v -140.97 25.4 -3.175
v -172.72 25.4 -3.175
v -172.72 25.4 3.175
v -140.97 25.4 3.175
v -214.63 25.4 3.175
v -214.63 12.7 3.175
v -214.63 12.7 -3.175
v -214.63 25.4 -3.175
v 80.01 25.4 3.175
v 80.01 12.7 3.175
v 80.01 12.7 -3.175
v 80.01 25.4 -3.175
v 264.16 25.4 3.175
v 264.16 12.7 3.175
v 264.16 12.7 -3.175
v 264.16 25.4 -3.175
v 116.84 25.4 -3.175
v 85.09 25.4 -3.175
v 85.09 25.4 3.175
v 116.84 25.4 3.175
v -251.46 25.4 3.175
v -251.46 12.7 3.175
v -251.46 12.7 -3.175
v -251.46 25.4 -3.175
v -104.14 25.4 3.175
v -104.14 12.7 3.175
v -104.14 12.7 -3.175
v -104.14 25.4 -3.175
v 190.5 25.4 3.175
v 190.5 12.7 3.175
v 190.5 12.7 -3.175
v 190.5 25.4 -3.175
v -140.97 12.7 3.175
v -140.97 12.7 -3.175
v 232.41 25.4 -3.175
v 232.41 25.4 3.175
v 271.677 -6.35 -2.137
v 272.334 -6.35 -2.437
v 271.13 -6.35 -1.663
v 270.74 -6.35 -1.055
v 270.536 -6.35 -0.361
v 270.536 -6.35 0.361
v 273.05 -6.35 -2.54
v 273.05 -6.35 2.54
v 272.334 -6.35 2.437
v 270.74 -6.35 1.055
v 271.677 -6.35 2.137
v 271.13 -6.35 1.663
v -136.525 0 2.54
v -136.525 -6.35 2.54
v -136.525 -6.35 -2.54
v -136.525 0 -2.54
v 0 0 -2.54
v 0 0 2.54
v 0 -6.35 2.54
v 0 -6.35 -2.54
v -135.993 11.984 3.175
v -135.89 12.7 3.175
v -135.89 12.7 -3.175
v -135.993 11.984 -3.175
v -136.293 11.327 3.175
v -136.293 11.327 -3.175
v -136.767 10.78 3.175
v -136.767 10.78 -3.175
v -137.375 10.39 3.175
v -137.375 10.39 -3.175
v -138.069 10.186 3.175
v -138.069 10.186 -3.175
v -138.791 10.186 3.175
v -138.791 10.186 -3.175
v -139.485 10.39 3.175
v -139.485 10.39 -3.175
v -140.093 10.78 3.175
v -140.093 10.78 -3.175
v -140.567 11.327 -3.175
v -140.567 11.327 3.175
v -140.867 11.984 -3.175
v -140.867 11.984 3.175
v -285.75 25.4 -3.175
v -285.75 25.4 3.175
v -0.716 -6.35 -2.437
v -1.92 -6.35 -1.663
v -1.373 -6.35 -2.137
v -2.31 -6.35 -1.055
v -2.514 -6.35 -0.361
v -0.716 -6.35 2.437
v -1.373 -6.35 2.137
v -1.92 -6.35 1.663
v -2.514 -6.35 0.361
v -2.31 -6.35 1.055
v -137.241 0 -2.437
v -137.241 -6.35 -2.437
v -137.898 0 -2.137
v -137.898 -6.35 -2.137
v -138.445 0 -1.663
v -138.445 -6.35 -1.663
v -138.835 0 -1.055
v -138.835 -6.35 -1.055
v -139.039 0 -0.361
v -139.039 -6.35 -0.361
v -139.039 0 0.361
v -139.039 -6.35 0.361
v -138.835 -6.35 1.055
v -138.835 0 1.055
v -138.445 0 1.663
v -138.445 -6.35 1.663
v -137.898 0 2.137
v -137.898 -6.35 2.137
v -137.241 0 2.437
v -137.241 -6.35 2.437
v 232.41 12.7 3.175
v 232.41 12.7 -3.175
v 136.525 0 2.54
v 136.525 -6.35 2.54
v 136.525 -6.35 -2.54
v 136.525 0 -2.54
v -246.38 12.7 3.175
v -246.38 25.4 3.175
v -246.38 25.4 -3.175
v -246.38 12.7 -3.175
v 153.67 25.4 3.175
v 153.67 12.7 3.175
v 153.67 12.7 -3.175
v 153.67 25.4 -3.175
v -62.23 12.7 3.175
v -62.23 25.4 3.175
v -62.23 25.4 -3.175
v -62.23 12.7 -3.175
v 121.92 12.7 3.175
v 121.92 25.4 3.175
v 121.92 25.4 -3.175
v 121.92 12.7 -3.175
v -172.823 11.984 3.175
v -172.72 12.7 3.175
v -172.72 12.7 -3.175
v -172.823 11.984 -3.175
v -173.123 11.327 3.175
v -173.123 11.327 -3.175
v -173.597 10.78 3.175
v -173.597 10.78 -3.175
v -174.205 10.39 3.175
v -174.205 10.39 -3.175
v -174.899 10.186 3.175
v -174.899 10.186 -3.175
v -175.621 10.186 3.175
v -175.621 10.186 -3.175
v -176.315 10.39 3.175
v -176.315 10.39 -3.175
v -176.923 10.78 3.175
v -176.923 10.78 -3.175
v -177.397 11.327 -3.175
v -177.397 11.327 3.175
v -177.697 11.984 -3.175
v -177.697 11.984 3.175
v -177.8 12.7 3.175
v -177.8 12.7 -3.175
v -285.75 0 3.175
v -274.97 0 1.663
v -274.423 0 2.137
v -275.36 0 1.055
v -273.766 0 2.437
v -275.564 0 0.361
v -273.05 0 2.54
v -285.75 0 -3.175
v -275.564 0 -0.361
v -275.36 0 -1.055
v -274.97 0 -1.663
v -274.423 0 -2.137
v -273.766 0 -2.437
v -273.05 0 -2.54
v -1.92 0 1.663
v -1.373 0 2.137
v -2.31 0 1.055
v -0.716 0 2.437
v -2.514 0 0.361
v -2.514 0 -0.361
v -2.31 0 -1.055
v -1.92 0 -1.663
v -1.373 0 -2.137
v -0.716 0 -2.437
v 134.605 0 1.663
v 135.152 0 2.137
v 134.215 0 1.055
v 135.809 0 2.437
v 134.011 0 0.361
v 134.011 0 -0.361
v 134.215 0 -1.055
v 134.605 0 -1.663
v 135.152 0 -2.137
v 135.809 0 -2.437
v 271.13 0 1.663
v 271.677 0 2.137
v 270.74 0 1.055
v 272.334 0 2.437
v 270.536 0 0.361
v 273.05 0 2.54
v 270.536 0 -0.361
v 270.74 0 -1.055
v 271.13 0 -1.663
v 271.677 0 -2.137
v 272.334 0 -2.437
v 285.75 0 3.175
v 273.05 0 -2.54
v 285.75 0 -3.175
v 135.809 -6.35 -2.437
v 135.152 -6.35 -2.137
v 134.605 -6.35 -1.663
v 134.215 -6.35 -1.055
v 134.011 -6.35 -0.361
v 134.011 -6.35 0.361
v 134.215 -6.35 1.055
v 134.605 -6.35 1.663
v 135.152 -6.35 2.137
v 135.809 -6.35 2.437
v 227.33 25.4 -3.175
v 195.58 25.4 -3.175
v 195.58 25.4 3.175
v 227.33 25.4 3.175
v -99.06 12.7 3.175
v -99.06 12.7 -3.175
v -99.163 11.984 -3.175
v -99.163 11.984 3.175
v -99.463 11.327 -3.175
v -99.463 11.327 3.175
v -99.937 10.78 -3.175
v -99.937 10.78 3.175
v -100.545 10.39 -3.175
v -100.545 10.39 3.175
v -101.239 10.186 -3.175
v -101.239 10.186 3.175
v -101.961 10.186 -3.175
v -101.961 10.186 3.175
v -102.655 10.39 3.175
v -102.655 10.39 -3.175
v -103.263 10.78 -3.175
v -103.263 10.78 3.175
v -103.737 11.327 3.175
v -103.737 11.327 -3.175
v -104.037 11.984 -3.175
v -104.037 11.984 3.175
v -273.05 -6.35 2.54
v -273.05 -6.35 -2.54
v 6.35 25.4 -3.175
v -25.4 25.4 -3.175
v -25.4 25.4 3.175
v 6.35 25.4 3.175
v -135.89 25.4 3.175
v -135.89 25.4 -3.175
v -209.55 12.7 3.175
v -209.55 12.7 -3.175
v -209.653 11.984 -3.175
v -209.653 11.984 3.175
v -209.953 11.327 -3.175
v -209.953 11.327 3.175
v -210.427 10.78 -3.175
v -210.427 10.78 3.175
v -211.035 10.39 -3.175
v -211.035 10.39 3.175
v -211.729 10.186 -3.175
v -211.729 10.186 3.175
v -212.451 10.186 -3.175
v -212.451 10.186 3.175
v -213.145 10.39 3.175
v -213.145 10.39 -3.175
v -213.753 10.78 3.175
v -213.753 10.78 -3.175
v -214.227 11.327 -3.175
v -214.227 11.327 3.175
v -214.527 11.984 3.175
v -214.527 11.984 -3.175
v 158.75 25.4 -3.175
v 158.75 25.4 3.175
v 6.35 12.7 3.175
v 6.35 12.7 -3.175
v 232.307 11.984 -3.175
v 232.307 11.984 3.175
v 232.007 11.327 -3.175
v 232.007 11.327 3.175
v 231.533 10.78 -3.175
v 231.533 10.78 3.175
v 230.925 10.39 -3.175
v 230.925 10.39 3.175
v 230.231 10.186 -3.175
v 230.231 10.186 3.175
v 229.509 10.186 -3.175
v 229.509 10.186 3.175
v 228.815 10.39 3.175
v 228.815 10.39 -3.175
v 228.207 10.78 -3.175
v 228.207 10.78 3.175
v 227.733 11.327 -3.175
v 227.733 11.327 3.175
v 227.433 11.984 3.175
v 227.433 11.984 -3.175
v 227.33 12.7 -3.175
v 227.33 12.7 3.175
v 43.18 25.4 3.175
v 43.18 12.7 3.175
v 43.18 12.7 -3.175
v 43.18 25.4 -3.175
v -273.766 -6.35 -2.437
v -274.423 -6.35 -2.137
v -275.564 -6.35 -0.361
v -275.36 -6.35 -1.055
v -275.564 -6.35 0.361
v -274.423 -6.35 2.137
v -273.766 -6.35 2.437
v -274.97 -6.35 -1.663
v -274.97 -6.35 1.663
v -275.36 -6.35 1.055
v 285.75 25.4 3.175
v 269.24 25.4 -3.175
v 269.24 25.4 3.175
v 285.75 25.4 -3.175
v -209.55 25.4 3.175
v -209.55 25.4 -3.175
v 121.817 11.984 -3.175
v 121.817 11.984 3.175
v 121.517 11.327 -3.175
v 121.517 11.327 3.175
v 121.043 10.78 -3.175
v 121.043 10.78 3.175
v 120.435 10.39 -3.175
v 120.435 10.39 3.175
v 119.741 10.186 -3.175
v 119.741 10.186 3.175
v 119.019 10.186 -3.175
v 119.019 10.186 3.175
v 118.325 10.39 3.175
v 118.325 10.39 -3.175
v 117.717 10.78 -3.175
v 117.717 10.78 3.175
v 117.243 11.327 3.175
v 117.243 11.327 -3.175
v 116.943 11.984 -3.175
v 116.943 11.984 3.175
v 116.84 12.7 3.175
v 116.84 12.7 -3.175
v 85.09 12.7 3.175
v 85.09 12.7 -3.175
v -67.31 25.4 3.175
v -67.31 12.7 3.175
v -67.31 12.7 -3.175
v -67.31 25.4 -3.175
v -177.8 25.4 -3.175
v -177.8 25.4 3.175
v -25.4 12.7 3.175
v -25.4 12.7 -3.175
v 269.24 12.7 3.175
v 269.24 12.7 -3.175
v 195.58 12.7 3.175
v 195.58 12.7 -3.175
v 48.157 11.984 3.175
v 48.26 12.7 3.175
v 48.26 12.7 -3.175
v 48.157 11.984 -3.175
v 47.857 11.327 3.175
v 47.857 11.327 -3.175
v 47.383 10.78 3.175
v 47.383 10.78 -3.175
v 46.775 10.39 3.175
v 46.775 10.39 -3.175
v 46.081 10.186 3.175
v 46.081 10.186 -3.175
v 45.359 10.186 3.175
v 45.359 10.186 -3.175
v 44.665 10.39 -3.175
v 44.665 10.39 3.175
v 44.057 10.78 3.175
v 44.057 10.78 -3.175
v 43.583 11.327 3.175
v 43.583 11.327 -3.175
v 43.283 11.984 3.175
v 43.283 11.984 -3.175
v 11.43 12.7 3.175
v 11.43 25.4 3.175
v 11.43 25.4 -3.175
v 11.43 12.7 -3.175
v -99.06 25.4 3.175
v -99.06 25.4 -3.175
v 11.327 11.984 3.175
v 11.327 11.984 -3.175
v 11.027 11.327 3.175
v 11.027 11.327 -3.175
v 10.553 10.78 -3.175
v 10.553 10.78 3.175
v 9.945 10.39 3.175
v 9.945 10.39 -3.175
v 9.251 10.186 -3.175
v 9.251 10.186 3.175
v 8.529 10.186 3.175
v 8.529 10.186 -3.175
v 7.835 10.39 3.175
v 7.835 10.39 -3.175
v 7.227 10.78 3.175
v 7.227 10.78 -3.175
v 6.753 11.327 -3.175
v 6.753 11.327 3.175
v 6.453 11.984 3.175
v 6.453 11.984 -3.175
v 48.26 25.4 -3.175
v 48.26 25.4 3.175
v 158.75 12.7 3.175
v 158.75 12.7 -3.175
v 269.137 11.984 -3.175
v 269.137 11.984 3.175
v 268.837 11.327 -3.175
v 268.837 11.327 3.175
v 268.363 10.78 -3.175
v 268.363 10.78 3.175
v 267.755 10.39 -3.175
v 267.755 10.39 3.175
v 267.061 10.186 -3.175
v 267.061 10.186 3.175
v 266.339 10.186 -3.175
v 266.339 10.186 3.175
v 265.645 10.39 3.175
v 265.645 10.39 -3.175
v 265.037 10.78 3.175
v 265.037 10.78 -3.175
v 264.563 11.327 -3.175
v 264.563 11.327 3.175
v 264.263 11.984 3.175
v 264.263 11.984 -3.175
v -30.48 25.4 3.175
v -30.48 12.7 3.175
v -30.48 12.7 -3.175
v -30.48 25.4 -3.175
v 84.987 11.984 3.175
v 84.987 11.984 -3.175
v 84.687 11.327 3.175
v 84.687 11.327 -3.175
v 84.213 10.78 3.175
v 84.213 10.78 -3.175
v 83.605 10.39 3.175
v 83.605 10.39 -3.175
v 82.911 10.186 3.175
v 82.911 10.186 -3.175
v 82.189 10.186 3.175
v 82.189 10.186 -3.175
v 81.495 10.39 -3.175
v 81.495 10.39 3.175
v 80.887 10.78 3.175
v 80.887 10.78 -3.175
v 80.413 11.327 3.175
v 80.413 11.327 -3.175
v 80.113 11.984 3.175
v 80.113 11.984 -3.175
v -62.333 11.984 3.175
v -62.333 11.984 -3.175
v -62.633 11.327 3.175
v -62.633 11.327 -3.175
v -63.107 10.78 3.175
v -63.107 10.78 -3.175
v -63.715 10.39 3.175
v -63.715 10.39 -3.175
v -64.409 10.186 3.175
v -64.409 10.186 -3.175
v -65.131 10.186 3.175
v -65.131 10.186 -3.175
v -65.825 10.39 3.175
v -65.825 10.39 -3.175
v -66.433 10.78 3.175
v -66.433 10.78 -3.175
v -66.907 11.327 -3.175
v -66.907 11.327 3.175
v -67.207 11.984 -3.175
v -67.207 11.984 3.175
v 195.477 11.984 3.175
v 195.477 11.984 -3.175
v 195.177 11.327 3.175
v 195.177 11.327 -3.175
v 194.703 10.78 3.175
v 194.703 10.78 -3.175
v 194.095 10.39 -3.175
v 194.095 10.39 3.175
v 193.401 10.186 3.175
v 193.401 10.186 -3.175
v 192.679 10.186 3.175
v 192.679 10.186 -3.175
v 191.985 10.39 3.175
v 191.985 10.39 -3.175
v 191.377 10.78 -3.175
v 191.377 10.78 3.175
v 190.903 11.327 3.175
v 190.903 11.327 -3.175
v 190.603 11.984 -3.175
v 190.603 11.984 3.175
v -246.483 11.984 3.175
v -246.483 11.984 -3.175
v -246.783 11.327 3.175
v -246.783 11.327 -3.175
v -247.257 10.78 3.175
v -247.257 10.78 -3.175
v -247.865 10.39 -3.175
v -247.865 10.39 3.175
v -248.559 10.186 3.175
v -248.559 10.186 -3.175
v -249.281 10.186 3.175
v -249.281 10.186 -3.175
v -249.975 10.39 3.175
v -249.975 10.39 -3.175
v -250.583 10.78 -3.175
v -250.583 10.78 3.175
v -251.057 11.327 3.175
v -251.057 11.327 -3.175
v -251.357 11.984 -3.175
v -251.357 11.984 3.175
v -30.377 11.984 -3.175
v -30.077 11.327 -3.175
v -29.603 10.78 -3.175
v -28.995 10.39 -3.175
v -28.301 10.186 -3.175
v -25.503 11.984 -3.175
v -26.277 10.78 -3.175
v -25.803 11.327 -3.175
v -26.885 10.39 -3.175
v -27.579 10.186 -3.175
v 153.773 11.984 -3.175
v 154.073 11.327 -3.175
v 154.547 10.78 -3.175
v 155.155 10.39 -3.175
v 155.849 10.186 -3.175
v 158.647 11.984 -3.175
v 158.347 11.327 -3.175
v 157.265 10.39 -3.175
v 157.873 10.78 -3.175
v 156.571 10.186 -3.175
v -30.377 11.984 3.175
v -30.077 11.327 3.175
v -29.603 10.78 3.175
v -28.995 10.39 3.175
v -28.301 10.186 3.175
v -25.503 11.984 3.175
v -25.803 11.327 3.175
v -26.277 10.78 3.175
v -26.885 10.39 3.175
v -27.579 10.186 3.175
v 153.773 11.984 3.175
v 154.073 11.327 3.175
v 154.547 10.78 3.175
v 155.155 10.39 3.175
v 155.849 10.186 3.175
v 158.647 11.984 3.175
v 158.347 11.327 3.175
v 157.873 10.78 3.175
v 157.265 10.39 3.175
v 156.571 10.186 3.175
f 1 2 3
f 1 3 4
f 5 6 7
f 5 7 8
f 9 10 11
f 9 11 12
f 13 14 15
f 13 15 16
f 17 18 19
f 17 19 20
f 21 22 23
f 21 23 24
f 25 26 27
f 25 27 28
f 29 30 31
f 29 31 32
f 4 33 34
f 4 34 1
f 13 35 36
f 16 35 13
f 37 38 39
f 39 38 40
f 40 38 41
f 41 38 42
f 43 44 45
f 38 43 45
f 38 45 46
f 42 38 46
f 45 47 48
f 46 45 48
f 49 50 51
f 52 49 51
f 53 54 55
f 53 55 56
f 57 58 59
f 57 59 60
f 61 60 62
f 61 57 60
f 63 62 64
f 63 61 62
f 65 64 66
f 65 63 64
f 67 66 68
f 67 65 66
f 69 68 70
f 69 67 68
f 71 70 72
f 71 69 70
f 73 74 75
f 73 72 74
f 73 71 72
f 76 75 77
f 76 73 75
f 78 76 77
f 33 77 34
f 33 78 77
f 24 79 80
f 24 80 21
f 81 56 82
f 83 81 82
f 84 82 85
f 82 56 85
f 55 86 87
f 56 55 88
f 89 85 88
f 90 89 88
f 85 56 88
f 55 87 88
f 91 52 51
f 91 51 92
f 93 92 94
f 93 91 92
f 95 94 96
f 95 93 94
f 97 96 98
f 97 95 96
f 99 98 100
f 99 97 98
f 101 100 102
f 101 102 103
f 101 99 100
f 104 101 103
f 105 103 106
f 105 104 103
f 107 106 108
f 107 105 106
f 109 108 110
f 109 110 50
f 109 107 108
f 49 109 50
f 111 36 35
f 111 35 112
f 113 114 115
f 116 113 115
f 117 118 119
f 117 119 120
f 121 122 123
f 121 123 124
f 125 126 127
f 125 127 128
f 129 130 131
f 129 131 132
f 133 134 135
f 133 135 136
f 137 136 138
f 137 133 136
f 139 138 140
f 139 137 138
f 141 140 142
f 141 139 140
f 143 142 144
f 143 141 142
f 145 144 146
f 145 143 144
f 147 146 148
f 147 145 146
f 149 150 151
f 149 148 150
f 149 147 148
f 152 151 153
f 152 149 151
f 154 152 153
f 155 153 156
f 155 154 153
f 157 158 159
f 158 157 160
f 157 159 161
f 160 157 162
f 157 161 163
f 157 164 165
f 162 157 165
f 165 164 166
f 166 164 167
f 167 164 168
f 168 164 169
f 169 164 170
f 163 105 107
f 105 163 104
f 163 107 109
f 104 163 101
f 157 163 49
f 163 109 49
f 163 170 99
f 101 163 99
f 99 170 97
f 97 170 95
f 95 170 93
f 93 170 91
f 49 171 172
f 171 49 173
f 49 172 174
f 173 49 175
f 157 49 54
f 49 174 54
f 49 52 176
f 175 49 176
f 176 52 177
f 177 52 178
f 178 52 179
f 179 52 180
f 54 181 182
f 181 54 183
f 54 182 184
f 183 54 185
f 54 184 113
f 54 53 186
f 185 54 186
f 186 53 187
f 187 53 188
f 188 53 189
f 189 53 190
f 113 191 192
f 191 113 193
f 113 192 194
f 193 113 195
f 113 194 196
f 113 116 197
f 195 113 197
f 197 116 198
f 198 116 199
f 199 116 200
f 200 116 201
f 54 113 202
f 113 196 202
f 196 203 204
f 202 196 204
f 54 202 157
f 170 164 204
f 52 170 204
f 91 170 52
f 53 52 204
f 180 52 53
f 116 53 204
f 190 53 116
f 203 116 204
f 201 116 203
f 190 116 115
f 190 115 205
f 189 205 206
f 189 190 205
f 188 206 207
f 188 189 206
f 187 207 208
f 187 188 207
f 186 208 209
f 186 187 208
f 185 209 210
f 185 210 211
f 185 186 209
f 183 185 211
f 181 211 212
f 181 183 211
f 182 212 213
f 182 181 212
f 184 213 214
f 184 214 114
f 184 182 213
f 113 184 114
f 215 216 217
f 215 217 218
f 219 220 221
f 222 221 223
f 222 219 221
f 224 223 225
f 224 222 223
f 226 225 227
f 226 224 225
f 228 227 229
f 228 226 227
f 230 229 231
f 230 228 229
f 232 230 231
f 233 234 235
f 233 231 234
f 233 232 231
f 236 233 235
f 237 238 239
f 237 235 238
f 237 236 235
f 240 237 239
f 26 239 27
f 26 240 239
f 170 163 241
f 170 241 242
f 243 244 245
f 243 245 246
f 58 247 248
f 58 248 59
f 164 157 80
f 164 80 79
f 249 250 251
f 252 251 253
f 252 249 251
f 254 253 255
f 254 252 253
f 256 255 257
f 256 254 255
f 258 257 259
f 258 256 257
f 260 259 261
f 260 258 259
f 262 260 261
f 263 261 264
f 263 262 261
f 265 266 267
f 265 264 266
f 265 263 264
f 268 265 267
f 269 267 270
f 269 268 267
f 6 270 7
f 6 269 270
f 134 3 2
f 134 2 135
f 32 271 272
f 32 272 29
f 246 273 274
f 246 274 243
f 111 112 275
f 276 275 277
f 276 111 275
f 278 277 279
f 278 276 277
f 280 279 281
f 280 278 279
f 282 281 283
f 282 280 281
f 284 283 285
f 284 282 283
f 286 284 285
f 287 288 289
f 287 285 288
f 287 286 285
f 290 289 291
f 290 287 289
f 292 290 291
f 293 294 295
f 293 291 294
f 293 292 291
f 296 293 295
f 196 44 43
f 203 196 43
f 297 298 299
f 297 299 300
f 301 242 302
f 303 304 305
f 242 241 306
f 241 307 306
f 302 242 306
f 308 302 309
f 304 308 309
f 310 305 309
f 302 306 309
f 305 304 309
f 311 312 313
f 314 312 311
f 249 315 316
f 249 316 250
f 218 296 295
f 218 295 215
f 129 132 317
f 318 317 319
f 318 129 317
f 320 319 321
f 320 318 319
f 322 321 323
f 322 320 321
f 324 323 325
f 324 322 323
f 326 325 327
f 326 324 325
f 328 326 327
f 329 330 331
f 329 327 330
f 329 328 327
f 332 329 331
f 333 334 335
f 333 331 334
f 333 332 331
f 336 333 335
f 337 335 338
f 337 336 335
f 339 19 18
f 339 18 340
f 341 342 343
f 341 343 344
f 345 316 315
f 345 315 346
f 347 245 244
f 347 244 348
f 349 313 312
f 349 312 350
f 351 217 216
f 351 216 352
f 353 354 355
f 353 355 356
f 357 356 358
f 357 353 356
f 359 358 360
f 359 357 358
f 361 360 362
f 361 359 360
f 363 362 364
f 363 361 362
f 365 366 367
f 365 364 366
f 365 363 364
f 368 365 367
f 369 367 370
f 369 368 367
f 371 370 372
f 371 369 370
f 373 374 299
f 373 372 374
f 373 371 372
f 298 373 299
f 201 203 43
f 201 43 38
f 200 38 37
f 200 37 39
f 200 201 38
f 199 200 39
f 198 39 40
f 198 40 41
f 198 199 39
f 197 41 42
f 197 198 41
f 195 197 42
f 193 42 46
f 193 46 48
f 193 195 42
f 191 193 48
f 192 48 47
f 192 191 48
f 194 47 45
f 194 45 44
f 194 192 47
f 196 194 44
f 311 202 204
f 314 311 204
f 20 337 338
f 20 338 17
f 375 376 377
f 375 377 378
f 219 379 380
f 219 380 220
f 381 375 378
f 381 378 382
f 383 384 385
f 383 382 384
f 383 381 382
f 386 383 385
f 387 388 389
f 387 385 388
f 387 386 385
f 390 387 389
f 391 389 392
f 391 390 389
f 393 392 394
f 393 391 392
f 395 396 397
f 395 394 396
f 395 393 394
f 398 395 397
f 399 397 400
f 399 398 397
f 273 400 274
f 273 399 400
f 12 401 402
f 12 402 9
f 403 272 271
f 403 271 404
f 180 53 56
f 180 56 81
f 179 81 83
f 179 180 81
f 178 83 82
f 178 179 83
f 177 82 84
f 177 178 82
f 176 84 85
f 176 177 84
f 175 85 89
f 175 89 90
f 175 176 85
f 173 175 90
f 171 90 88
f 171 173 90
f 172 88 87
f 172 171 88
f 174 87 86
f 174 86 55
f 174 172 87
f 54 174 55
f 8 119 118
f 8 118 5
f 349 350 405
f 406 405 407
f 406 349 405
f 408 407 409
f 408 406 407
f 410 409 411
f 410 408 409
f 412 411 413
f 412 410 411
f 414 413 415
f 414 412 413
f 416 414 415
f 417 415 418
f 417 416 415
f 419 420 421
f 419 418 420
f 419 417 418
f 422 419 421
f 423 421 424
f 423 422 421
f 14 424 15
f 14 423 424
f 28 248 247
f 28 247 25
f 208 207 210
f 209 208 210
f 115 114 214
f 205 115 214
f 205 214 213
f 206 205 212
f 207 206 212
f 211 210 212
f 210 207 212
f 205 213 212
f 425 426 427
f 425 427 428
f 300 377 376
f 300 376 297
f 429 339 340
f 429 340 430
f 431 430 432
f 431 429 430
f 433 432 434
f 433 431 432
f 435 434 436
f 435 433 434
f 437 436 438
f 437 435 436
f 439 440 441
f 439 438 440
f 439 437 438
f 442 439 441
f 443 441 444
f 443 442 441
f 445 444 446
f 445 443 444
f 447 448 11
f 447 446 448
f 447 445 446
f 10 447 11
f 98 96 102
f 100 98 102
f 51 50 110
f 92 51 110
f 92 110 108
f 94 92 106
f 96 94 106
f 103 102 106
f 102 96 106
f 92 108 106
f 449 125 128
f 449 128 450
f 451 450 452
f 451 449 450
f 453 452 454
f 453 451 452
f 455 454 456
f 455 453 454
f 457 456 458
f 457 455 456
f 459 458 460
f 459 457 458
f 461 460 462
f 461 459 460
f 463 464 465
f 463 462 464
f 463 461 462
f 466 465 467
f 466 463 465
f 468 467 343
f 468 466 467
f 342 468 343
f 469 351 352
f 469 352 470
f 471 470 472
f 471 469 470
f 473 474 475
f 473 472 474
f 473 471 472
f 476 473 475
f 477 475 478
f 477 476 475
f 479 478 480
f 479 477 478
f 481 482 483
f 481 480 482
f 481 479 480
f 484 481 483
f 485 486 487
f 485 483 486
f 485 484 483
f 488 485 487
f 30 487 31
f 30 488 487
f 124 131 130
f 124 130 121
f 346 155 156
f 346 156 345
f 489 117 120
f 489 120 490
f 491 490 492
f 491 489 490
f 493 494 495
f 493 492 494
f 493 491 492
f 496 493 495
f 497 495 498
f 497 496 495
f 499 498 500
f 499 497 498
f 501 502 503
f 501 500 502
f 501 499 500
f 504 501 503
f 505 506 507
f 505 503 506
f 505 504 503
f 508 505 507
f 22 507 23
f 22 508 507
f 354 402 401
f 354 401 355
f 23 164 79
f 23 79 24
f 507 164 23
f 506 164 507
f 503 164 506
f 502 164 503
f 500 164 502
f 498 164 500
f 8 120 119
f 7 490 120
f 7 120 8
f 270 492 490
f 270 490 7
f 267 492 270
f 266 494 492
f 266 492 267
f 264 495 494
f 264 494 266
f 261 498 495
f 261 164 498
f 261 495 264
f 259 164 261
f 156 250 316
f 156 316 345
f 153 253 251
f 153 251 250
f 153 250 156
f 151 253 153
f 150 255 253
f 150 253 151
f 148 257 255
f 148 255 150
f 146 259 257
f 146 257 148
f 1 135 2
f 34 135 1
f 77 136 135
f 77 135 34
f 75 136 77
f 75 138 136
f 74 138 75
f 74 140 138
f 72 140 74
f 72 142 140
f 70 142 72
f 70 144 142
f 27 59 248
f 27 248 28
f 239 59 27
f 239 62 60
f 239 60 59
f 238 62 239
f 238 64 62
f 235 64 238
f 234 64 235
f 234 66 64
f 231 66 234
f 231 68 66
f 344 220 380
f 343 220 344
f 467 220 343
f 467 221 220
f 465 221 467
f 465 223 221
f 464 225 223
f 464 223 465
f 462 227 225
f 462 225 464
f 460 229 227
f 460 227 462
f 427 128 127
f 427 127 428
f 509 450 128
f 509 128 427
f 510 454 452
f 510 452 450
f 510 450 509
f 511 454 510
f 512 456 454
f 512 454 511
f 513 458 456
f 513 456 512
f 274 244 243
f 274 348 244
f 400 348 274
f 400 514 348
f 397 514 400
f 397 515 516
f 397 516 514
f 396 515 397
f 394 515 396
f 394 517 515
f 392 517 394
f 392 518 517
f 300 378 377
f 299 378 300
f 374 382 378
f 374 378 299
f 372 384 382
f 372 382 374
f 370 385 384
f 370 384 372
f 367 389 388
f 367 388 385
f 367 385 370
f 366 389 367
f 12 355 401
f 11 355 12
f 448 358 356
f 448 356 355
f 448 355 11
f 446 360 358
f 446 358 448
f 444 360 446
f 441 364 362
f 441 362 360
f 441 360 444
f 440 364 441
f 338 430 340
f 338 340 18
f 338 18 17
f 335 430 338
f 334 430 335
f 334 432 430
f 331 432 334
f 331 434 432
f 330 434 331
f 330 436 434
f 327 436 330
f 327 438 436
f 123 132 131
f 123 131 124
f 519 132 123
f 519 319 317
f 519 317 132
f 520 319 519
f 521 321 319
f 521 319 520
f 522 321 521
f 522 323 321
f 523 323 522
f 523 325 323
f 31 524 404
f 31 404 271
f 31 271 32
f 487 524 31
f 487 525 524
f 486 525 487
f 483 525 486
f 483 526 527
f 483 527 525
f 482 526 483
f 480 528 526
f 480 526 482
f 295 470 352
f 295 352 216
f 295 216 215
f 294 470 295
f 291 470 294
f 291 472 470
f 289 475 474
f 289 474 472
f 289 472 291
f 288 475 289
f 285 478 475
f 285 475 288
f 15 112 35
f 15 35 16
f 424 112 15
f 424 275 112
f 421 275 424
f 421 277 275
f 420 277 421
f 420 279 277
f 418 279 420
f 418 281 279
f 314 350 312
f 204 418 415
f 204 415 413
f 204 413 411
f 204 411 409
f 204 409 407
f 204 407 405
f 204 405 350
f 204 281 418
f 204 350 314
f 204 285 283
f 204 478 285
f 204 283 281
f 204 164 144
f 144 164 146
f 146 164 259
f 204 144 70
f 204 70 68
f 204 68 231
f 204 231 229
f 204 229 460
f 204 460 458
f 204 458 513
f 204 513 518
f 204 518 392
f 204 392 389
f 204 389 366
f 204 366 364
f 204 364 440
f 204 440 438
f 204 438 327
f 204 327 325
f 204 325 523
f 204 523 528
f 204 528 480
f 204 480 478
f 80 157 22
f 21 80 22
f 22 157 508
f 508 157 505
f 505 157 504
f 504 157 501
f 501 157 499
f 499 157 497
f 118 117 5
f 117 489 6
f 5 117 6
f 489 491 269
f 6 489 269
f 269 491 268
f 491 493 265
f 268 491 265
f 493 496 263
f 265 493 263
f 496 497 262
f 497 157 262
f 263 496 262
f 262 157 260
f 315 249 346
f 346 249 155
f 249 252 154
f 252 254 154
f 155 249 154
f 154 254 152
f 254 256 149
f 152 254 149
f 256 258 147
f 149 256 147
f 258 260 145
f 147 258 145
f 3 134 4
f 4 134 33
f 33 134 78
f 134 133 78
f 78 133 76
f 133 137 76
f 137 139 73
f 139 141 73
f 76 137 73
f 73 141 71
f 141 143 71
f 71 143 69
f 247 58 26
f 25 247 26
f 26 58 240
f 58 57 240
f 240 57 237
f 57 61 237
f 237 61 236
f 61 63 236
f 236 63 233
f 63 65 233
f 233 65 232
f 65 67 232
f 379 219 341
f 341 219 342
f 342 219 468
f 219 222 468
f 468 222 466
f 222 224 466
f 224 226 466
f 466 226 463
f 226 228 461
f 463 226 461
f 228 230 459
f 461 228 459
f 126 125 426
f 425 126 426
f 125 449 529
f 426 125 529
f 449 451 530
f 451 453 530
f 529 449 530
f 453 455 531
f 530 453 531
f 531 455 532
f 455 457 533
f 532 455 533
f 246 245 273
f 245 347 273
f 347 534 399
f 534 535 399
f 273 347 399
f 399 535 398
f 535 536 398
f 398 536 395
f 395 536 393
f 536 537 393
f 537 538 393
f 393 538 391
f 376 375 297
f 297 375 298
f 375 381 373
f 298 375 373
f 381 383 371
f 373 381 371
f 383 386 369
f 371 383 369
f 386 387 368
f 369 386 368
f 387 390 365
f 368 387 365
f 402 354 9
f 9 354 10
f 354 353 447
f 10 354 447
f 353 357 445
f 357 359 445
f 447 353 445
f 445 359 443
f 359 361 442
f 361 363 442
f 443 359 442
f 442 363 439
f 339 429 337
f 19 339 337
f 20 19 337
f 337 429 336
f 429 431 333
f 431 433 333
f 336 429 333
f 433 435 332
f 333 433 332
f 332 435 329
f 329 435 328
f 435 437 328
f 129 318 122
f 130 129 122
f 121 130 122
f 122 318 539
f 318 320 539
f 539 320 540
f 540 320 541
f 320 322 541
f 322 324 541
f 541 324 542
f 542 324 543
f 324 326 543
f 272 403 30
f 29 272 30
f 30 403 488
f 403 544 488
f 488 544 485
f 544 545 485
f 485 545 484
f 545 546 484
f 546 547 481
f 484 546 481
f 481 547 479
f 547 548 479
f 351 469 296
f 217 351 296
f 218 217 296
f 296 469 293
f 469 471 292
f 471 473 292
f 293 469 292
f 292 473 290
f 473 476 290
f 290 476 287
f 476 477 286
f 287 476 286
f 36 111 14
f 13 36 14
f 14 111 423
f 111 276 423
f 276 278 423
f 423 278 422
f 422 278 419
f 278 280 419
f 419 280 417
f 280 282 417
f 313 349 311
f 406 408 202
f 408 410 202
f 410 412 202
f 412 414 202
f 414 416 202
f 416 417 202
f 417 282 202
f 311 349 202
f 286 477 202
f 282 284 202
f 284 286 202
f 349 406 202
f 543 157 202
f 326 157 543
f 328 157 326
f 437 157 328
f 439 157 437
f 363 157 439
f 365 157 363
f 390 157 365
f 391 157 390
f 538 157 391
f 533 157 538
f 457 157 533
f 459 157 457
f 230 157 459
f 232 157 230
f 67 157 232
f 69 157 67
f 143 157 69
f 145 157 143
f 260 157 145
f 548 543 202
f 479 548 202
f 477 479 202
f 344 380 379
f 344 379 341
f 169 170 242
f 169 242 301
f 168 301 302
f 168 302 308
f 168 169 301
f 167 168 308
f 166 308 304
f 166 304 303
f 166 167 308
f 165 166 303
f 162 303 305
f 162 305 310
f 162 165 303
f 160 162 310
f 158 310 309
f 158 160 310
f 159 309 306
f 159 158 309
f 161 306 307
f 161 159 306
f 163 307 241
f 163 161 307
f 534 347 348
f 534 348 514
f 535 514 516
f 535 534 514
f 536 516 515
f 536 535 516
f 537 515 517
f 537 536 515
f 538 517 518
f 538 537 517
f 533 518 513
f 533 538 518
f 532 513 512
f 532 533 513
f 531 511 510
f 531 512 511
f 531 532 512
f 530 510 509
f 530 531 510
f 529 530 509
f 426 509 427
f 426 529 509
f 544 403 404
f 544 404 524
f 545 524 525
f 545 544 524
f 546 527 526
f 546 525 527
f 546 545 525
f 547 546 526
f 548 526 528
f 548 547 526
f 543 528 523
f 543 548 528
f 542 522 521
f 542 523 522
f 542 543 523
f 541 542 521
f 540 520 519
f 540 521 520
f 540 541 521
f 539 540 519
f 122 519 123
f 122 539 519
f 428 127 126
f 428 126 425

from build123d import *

# Parameters (mm, degrees)
SKETCH1_W           = 571.5
SKETCH1_H           = 6.35
BOSS_EXTRUDE1_DEPTH = 25.4
BOSS_EXTRUDE2_DEPTH = 6.35
CUT_EXTRUDE1_DEPTH  = 287.946937603


with BuildPart() as part:
    # Sketch1 → Boss-Extrude1 (new body)
    with BuildSketch(Plane(origin=(0, 0, 0), x_dir=(1, 0, 0), z_dir=(0, 1, 0))):
        Rectangle(SKETCH1_W, SKETCH1_H)
    extrude(amount=BOSS_EXTRUDE1_DEPTH)

    # Sketch2 → Boss-Extrude2 (add)
    with BuildSketch(Plane.XZ):
        with BuildLine():
            Line((-273.05, 2.54), (-273.05, -2.54))
            ThreePointArc((-273.05, -2.54), (-275.59, 0), (-273.05, 2.54))
        make_face()
        with BuildLine():
            Line((-136.525, 2.54), (-136.525, -2.54))
            ThreePointArc((-136.525, -2.54), (-139.065, 0), (-136.525, 2.54))
        make_face()
        with BuildLine():
            Line((0, 2.54), (0, -2.54))
            ThreePointArc((0, -2.54), (-2.54, 0), (0, 2.54))
        make_face()
        with BuildLine():
            Line((136.525, 2.54), (136.525, -2.54))
            ThreePointArc((136.525, -2.54), (133.985, 0), (136.525, 2.54))
        make_face()
        with BuildLine():
            Line((273.05, 2.54), (273.05, -2.54))
            ThreePointArc((273.05, -2.54), (270.51, 0), (273.05, 2.54))
        make_face()
    extrude(amount=BOSS_EXTRUDE2_DEPTH)

    # Sketch3 → Cut-Extrude1 (cut, through all)
    with BuildSketch(Plane.XY.offset(3.175)):
        with BuildLine():
            Line((-246.38, 38.1), (-246.38, 12.7))
            ThreePointArc((-246.38, 12.7), (-248.92, 10.16), (-251.46, 12.7))
            Line((-251.46, 12.7), (-251.46, 38.1))
            ThreePointArc((-251.46, 38.1), (-248.92, 40.64), (-246.38, 38.1))
        make_face()
        with BuildLine():
            Line((-209.55, 38.1), (-209.55, 12.7))
            ThreePointArc((-209.55, 12.7), (-212.09, 10.16), (-214.63, 12.7))
            Line((-214.63, 12.7), (-214.63, 38.1))
            ThreePointArc((-214.63, 38.1), (-212.09, 40.64), (-209.55, 38.1))
        make_face()
        with BuildLine():
            Line((-172.72, 38.1), (-172.72, 12.7))
            ThreePointArc((-172.72, 12.7), (-175.26, 10.16), (-177.8, 12.7))
            Line((-177.8, 12.7), (-177.8, 38.1))
            ThreePointArc((-177.8, 38.1), (-175.26, 40.64), (-172.72, 38.1))
        make_face()
        with BuildLine():
            Line((-135.89, 38.1), (-135.89, 12.7))
            ThreePointArc((-135.89, 12.7), (-138.43, 10.16), (-140.97, 12.7))
            Line((-140.97, 12.7), (-140.97, 38.1))
            ThreePointArc((-140.97, 38.1), (-138.43, 40.64), (-135.89, 38.1))
        make_face()
        with BuildLine():
            Line((-99.06, 38.1), (-99.06, 12.7))
            ThreePointArc((-99.06, 12.7), (-101.6, 10.16), (-104.14, 12.7))
            Line((-104.14, 12.7), (-104.14, 38.1))
            ThreePointArc((-104.14, 38.1), (-101.6, 40.64), (-99.06, 38.1))
        make_face()
        with BuildLine():
            Line((-62.23, 38.1), (-62.23, 12.7))
            ThreePointArc((-62.23, 12.7), (-64.77, 10.16), (-67.31, 12.7))
            Line((-67.31, 12.7), (-67.31, 38.1))
            ThreePointArc((-67.31, 38.1), (-64.77, 40.64), (-62.23, 38.1))
        make_face()
        with BuildLine():
            Line((-25.4, 38.1), (-25.4, 12.7))
            ThreePointArc((-25.4, 12.7), (-27.94, 10.16), (-30.48, 12.7))
            Line((-30.48, 12.7), (-30.48, 38.1))
            ThreePointArc((-30.48, 38.1), (-27.94, 40.64), (-25.4, 38.1))
        make_face()
        with BuildLine():
            Line((11.43, 38.1), (11.43, 12.7))
            ThreePointArc((11.43, 12.7), (8.89, 10.16), (6.35, 12.7))
            Line((6.35, 12.7), (6.35, 38.1))
            ThreePointArc((6.35, 38.1), (8.89, 40.64), (11.43, 38.1))
        make_face()
        with BuildLine():
            Line((48.26, 38.1), (48.26, 12.7))
            ThreePointArc((48.26, 12.7), (45.72, 10.16), (43.18, 12.7))
            Line((43.18, 12.7), (43.18, 38.1))
            ThreePointArc((43.18, 38.1), (45.72, 40.64), (48.26, 38.1))
        make_face()
        with BuildLine():
            Line((85.09, 38.1), (85.09, 12.7))
            ThreePointArc((85.09, 12.7), (82.55, 10.16), (80.01, 12.7))
            Line((80.01, 12.7), (80.01, 38.1))
            ThreePointArc((80.01, 38.1), (82.55, 40.64), (85.09, 38.1))
        make_face()
        with BuildLine():
            Line((121.92, 38.1), (121.92, 12.7))
            ThreePointArc((121.92, 12.7), (119.38, 10.16), (116.84, 12.7))
            Line((116.84, 12.7), (116.84, 38.1))
            ThreePointArc((116.84, 38.1), (119.38, 40.64), (121.92, 38.1))
        make_face()
        with BuildLine():
            Line((158.75, 38.1), (158.75, 12.7))
            ThreePointArc((158.75, 12.7), (156.21, 10.16), (153.67, 12.7))
            Line((153.67, 12.7), (153.67, 38.1))
            ThreePointArc((153.67, 38.1), (156.21, 40.64), (158.75, 38.1))
        make_face()
        with BuildLine():
            Line((195.58, 38.1), (195.58, 12.7))
            ThreePointArc((195.58, 12.7), (193.04, 10.16), (190.5, 12.7))
            Line((190.5, 12.7), (190.5, 38.1))
            ThreePointArc((190.5, 38.1), (193.04, 40.64), (195.58, 38.1))
        make_face()
        with BuildLine():
            Line((232.41, 38.1), (232.41, 12.7))
            ThreePointArc((232.41, 12.7), (229.87, 10.16), (227.33, 12.7))
            Line((227.33, 12.7), (227.33, 38.1))
            ThreePointArc((227.33, 38.1), (229.87, 40.64), (232.41, 38.1))
        make_face()
        with BuildLine():
            Line((269.24, 38.1), (269.24, 12.7))
            ThreePointArc((269.24, 12.7), (266.7, 10.16), (264.16, 12.7))
            Line((264.16, 12.7), (264.16, 38.1))
            ThreePointArc((264.16, 38.1), (266.7, 40.64), (269.24, 38.1))
        make_face()
    extrude(amount=-CUT_EXTRUDE1_DEPTH, mode=Mode.SUBTRACT)


solid = part.part
